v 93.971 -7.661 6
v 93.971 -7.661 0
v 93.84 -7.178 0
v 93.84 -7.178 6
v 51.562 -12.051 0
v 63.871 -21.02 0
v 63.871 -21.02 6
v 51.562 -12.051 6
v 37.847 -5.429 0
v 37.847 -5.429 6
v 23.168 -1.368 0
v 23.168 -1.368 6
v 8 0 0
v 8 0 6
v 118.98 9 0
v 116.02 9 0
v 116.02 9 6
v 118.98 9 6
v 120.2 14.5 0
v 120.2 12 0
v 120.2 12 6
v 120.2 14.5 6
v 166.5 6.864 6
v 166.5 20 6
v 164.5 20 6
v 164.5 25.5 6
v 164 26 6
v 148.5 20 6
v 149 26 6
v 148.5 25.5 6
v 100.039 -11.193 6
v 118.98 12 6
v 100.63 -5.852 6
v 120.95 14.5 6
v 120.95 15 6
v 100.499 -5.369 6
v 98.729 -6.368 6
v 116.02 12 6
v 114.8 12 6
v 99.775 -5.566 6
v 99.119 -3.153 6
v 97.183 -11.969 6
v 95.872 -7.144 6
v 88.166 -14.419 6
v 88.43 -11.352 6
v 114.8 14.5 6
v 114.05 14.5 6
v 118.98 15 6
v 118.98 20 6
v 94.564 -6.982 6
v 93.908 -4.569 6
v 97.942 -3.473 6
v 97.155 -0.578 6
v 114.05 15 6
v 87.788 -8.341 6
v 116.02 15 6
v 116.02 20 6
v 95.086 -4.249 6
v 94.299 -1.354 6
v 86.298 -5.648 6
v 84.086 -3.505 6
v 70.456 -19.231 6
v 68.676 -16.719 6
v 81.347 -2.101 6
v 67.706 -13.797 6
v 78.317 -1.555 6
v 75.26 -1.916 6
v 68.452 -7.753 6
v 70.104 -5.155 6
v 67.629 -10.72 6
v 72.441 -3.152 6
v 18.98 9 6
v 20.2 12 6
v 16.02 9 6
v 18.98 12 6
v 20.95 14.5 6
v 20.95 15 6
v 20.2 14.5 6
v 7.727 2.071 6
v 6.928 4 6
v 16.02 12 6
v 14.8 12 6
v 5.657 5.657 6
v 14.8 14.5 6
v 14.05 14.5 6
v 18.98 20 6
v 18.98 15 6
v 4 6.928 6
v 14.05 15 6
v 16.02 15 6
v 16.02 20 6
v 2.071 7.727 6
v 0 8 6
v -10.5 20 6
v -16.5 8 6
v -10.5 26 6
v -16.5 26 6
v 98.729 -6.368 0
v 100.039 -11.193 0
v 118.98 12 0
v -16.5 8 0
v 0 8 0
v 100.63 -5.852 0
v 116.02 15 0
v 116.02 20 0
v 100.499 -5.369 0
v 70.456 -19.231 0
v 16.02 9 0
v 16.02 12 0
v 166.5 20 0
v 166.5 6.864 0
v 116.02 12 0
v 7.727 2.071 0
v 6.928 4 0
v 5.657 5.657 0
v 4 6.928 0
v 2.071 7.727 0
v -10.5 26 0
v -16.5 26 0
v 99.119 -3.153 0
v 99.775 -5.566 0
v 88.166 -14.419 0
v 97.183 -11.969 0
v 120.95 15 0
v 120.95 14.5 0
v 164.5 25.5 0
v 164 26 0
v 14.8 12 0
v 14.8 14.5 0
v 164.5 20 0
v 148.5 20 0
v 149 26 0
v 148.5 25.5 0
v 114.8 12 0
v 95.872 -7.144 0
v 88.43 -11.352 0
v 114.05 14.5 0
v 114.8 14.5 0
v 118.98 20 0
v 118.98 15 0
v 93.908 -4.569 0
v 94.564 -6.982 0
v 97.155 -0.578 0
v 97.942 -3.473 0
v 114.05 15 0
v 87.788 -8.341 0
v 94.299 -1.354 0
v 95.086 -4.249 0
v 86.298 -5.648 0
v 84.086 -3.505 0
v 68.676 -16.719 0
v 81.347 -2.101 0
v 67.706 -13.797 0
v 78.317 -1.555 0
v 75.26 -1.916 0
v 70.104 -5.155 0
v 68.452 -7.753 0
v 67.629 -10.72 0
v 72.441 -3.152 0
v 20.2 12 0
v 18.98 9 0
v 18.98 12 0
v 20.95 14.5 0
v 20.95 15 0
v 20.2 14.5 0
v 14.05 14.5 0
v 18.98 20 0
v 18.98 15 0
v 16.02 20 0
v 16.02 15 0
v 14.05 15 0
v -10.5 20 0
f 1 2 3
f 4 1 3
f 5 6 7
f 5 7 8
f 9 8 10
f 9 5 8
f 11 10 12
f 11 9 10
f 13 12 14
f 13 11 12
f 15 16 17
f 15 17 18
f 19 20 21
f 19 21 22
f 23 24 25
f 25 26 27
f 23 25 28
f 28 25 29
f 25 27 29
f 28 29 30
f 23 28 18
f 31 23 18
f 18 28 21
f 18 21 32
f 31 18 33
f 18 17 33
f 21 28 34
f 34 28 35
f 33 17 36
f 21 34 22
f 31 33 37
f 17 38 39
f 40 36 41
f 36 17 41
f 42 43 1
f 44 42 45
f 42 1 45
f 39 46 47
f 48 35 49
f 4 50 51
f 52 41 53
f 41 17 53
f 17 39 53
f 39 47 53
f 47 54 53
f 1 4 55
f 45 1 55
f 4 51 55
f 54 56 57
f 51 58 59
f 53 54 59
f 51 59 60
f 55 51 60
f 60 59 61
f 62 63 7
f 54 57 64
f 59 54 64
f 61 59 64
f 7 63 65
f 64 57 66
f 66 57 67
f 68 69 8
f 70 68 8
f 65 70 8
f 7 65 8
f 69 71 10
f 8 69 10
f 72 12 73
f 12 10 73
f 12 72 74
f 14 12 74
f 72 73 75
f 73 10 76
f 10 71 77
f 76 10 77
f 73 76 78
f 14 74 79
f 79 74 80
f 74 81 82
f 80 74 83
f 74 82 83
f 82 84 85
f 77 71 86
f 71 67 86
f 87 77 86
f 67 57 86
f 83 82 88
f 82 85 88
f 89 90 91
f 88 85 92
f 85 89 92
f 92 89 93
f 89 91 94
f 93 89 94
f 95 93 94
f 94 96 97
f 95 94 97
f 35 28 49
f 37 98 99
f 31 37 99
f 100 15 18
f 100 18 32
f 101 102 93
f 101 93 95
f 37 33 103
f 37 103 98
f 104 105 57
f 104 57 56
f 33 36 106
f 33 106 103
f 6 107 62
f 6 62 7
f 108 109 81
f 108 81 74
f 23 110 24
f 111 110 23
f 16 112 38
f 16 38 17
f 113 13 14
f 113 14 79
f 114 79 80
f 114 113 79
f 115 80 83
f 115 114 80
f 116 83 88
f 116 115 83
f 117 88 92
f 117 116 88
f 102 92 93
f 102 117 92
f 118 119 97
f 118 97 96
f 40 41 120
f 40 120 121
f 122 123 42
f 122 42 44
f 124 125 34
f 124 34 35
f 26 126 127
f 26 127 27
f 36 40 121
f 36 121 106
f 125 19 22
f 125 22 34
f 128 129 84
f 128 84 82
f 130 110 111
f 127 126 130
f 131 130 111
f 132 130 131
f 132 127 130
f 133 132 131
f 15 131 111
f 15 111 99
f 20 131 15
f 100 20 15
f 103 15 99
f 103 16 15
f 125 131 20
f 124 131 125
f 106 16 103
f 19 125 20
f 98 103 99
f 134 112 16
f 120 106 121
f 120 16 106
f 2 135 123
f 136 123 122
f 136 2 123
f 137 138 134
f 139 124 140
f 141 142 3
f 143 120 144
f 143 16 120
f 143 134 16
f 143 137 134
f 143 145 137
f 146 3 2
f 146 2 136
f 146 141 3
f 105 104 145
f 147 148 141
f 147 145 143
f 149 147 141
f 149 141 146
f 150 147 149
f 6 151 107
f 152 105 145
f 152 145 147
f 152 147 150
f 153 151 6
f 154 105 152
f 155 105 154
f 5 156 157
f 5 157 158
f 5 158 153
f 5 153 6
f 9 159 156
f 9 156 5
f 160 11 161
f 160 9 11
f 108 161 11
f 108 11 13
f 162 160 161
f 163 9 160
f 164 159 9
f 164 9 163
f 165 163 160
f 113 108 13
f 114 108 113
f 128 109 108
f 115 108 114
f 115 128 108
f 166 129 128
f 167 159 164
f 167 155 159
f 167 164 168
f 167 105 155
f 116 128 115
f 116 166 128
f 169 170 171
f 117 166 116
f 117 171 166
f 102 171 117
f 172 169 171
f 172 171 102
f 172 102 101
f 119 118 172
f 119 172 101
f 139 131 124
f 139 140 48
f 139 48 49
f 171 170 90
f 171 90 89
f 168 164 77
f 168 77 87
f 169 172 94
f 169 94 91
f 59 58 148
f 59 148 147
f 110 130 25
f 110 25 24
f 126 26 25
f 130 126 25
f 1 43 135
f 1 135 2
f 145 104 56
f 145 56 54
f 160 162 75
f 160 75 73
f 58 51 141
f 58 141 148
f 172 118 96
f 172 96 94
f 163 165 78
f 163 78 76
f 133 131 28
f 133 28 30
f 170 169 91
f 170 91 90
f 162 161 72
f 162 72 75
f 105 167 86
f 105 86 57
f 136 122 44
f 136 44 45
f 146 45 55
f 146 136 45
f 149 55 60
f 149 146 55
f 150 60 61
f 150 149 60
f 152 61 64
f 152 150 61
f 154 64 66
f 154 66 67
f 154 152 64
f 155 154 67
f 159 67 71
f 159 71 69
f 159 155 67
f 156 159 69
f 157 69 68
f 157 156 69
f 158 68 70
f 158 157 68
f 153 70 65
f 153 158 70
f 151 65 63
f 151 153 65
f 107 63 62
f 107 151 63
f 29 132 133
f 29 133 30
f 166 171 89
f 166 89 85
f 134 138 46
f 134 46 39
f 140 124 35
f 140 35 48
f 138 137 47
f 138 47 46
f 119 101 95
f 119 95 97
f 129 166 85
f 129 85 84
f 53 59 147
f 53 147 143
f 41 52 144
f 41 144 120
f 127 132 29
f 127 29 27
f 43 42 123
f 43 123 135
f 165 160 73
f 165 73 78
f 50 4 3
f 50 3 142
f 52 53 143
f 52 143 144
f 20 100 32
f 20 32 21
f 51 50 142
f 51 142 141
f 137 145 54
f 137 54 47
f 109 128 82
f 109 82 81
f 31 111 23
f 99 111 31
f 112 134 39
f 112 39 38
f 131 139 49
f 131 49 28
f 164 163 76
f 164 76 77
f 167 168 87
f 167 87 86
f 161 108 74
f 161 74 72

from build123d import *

# Parameters (mm, degrees)
BOSS_EXTRUDE1_DEPTH = 6
CHAMFER2_SIZE       = 0.5
CUT_EXTRUDE1_DEPTH  = 7


with BuildPart() as part:
    # Sketch1 → Boss-Extrude1 (new body)
    with BuildSketch(Plane.XY):
        with BuildLine():
            Line((116.02, 20), (116.02, 15))
            Line((116.02, 15), (114.05, 15))
            Line((114.05, 15), (114.05, 14.5))
            Line((114.05, 14.5), (114.8, 14.5))
            Line((114.8, 14.5), (114.8, 12))
            Line((114.8, 12), (116.02, 12))
            Line((116.02, 12), (116.02, 9))
            Line((116.02, 9), (118.98, 9))
            Line((118.98, 9), (118.98, 12))
            Line((118.98, 12), (120.2, 12))
            Line((120.2, 12), (120.2, 14.5))
            Line((120.2, 14.5), (120.95, 14.5))
            Line((120.95, 14.5), (120.95, 15))
            Line((120.95, 15), (118.98, 15))
            Line((118.98, 15), (118.98, 20))
            Line((118.98, 20), (148.5, 20))
            Line((148.5, 20), (148.5, 26))
            Line((148.5, 26), (164.5, 26))
            Line((164.5, 26), (164.5, 20))
            Line((164.5, 20), (166.5, 20))
            Line((166.5, 20), (166.5, 6.863840125))
            Line((166.5, 6.863840125), (88.166127224, -14.419164582))
            ThreePointArc((88.166127224, -14.419164582), (75.2601036, -1.915582926), (70.455783207, -19.230995297))
            Line((70.455783207, -19.230995297), (63.870699409, -21.020136629))
            ThreePointArc((63.870699409, -21.020136629), (37.847031663, -5.428892585), (8, 0))
            ThreePointArc((8, 0), (5.656854017, 5.656854482), (-6.59e-07, 8))
            Line((-6.59e-07, 8), (-16.5, 8))
            Line((-16.5, 8), (-16.5, 26))
            Line((-16.5, 26), (-10.5, 26))
            Line((-10.5, 26), (-10.5, 20))
            Line((-10.5, 20), (16.02, 20))
            Line((16.02, 20), (16.02, 15))
            Line((16.02, 15), (14.05, 15))
            Line((14.05, 15), (14.05, 14.5))
            Line((14.05, 14.5), (14.8, 14.5))
            Line((14.8, 14.5), (14.8, 12))
            Line((14.8, 12), (16.02, 12))
            Line((16.02, 12), (16.02, 9))
            Line((16.02, 9), (18.98, 9))
            Line((18.98, 9), (18.98, 12))
            Line((18.98, 12), (20.2, 12))
            Line((20.2, 12), (20.2, 14.5))
            Line((20.2, 14.5), (20.95, 14.5))
            Line((20.95, 14.5), (20.95, 15))
            Line((20.95, 15), (18.98, 15))
            Line((18.98, 15), (18.98, 20))
            Line((18.98, 20), (116.02, 20))
        make_face()
    extrude(amount=BOSS_EXTRUDE1_DEPTH)

    # Chamfer2
    chamfer2_edges = [part.edges().sort_by_distance(p)[0] for p in [
        (148.5, 26, 3),
        (164.5, 26, 3),
    ]]
    chamfer(chamfer2_edges, length=CHAMFER2_SIZE)

    # Sketch2 → Cut-Extrude1 (cut, through all)
    with BuildSketch(Plane.XY.offset(6)):
        Polygon((100.039498636, -11.193216334), (97.183051312, -11.969301821), (95.872096096, -7.144221882), (93.9710146, -7.660738237), (93.839919078, -7.178230243), (94.563681069, -6.981586961), (93.908203462, -4.569046991), (95.085522967, -4.249173918), (94.298949838, -1.354125954), (97.155397162, -0.578040467), (97.941970291, -3.473088431), (99.119289796, -3.153215358), (99.774767404, -5.565755328), (100.498529395, -5.369112046), (100.629624916, -5.851620039), (98.72854342, -6.368136394), align=None)
    extrude(amount=-CUT_EXTRUDE1_DEPTH, mode=Mode.SUBTRACT)


solid = part.part
